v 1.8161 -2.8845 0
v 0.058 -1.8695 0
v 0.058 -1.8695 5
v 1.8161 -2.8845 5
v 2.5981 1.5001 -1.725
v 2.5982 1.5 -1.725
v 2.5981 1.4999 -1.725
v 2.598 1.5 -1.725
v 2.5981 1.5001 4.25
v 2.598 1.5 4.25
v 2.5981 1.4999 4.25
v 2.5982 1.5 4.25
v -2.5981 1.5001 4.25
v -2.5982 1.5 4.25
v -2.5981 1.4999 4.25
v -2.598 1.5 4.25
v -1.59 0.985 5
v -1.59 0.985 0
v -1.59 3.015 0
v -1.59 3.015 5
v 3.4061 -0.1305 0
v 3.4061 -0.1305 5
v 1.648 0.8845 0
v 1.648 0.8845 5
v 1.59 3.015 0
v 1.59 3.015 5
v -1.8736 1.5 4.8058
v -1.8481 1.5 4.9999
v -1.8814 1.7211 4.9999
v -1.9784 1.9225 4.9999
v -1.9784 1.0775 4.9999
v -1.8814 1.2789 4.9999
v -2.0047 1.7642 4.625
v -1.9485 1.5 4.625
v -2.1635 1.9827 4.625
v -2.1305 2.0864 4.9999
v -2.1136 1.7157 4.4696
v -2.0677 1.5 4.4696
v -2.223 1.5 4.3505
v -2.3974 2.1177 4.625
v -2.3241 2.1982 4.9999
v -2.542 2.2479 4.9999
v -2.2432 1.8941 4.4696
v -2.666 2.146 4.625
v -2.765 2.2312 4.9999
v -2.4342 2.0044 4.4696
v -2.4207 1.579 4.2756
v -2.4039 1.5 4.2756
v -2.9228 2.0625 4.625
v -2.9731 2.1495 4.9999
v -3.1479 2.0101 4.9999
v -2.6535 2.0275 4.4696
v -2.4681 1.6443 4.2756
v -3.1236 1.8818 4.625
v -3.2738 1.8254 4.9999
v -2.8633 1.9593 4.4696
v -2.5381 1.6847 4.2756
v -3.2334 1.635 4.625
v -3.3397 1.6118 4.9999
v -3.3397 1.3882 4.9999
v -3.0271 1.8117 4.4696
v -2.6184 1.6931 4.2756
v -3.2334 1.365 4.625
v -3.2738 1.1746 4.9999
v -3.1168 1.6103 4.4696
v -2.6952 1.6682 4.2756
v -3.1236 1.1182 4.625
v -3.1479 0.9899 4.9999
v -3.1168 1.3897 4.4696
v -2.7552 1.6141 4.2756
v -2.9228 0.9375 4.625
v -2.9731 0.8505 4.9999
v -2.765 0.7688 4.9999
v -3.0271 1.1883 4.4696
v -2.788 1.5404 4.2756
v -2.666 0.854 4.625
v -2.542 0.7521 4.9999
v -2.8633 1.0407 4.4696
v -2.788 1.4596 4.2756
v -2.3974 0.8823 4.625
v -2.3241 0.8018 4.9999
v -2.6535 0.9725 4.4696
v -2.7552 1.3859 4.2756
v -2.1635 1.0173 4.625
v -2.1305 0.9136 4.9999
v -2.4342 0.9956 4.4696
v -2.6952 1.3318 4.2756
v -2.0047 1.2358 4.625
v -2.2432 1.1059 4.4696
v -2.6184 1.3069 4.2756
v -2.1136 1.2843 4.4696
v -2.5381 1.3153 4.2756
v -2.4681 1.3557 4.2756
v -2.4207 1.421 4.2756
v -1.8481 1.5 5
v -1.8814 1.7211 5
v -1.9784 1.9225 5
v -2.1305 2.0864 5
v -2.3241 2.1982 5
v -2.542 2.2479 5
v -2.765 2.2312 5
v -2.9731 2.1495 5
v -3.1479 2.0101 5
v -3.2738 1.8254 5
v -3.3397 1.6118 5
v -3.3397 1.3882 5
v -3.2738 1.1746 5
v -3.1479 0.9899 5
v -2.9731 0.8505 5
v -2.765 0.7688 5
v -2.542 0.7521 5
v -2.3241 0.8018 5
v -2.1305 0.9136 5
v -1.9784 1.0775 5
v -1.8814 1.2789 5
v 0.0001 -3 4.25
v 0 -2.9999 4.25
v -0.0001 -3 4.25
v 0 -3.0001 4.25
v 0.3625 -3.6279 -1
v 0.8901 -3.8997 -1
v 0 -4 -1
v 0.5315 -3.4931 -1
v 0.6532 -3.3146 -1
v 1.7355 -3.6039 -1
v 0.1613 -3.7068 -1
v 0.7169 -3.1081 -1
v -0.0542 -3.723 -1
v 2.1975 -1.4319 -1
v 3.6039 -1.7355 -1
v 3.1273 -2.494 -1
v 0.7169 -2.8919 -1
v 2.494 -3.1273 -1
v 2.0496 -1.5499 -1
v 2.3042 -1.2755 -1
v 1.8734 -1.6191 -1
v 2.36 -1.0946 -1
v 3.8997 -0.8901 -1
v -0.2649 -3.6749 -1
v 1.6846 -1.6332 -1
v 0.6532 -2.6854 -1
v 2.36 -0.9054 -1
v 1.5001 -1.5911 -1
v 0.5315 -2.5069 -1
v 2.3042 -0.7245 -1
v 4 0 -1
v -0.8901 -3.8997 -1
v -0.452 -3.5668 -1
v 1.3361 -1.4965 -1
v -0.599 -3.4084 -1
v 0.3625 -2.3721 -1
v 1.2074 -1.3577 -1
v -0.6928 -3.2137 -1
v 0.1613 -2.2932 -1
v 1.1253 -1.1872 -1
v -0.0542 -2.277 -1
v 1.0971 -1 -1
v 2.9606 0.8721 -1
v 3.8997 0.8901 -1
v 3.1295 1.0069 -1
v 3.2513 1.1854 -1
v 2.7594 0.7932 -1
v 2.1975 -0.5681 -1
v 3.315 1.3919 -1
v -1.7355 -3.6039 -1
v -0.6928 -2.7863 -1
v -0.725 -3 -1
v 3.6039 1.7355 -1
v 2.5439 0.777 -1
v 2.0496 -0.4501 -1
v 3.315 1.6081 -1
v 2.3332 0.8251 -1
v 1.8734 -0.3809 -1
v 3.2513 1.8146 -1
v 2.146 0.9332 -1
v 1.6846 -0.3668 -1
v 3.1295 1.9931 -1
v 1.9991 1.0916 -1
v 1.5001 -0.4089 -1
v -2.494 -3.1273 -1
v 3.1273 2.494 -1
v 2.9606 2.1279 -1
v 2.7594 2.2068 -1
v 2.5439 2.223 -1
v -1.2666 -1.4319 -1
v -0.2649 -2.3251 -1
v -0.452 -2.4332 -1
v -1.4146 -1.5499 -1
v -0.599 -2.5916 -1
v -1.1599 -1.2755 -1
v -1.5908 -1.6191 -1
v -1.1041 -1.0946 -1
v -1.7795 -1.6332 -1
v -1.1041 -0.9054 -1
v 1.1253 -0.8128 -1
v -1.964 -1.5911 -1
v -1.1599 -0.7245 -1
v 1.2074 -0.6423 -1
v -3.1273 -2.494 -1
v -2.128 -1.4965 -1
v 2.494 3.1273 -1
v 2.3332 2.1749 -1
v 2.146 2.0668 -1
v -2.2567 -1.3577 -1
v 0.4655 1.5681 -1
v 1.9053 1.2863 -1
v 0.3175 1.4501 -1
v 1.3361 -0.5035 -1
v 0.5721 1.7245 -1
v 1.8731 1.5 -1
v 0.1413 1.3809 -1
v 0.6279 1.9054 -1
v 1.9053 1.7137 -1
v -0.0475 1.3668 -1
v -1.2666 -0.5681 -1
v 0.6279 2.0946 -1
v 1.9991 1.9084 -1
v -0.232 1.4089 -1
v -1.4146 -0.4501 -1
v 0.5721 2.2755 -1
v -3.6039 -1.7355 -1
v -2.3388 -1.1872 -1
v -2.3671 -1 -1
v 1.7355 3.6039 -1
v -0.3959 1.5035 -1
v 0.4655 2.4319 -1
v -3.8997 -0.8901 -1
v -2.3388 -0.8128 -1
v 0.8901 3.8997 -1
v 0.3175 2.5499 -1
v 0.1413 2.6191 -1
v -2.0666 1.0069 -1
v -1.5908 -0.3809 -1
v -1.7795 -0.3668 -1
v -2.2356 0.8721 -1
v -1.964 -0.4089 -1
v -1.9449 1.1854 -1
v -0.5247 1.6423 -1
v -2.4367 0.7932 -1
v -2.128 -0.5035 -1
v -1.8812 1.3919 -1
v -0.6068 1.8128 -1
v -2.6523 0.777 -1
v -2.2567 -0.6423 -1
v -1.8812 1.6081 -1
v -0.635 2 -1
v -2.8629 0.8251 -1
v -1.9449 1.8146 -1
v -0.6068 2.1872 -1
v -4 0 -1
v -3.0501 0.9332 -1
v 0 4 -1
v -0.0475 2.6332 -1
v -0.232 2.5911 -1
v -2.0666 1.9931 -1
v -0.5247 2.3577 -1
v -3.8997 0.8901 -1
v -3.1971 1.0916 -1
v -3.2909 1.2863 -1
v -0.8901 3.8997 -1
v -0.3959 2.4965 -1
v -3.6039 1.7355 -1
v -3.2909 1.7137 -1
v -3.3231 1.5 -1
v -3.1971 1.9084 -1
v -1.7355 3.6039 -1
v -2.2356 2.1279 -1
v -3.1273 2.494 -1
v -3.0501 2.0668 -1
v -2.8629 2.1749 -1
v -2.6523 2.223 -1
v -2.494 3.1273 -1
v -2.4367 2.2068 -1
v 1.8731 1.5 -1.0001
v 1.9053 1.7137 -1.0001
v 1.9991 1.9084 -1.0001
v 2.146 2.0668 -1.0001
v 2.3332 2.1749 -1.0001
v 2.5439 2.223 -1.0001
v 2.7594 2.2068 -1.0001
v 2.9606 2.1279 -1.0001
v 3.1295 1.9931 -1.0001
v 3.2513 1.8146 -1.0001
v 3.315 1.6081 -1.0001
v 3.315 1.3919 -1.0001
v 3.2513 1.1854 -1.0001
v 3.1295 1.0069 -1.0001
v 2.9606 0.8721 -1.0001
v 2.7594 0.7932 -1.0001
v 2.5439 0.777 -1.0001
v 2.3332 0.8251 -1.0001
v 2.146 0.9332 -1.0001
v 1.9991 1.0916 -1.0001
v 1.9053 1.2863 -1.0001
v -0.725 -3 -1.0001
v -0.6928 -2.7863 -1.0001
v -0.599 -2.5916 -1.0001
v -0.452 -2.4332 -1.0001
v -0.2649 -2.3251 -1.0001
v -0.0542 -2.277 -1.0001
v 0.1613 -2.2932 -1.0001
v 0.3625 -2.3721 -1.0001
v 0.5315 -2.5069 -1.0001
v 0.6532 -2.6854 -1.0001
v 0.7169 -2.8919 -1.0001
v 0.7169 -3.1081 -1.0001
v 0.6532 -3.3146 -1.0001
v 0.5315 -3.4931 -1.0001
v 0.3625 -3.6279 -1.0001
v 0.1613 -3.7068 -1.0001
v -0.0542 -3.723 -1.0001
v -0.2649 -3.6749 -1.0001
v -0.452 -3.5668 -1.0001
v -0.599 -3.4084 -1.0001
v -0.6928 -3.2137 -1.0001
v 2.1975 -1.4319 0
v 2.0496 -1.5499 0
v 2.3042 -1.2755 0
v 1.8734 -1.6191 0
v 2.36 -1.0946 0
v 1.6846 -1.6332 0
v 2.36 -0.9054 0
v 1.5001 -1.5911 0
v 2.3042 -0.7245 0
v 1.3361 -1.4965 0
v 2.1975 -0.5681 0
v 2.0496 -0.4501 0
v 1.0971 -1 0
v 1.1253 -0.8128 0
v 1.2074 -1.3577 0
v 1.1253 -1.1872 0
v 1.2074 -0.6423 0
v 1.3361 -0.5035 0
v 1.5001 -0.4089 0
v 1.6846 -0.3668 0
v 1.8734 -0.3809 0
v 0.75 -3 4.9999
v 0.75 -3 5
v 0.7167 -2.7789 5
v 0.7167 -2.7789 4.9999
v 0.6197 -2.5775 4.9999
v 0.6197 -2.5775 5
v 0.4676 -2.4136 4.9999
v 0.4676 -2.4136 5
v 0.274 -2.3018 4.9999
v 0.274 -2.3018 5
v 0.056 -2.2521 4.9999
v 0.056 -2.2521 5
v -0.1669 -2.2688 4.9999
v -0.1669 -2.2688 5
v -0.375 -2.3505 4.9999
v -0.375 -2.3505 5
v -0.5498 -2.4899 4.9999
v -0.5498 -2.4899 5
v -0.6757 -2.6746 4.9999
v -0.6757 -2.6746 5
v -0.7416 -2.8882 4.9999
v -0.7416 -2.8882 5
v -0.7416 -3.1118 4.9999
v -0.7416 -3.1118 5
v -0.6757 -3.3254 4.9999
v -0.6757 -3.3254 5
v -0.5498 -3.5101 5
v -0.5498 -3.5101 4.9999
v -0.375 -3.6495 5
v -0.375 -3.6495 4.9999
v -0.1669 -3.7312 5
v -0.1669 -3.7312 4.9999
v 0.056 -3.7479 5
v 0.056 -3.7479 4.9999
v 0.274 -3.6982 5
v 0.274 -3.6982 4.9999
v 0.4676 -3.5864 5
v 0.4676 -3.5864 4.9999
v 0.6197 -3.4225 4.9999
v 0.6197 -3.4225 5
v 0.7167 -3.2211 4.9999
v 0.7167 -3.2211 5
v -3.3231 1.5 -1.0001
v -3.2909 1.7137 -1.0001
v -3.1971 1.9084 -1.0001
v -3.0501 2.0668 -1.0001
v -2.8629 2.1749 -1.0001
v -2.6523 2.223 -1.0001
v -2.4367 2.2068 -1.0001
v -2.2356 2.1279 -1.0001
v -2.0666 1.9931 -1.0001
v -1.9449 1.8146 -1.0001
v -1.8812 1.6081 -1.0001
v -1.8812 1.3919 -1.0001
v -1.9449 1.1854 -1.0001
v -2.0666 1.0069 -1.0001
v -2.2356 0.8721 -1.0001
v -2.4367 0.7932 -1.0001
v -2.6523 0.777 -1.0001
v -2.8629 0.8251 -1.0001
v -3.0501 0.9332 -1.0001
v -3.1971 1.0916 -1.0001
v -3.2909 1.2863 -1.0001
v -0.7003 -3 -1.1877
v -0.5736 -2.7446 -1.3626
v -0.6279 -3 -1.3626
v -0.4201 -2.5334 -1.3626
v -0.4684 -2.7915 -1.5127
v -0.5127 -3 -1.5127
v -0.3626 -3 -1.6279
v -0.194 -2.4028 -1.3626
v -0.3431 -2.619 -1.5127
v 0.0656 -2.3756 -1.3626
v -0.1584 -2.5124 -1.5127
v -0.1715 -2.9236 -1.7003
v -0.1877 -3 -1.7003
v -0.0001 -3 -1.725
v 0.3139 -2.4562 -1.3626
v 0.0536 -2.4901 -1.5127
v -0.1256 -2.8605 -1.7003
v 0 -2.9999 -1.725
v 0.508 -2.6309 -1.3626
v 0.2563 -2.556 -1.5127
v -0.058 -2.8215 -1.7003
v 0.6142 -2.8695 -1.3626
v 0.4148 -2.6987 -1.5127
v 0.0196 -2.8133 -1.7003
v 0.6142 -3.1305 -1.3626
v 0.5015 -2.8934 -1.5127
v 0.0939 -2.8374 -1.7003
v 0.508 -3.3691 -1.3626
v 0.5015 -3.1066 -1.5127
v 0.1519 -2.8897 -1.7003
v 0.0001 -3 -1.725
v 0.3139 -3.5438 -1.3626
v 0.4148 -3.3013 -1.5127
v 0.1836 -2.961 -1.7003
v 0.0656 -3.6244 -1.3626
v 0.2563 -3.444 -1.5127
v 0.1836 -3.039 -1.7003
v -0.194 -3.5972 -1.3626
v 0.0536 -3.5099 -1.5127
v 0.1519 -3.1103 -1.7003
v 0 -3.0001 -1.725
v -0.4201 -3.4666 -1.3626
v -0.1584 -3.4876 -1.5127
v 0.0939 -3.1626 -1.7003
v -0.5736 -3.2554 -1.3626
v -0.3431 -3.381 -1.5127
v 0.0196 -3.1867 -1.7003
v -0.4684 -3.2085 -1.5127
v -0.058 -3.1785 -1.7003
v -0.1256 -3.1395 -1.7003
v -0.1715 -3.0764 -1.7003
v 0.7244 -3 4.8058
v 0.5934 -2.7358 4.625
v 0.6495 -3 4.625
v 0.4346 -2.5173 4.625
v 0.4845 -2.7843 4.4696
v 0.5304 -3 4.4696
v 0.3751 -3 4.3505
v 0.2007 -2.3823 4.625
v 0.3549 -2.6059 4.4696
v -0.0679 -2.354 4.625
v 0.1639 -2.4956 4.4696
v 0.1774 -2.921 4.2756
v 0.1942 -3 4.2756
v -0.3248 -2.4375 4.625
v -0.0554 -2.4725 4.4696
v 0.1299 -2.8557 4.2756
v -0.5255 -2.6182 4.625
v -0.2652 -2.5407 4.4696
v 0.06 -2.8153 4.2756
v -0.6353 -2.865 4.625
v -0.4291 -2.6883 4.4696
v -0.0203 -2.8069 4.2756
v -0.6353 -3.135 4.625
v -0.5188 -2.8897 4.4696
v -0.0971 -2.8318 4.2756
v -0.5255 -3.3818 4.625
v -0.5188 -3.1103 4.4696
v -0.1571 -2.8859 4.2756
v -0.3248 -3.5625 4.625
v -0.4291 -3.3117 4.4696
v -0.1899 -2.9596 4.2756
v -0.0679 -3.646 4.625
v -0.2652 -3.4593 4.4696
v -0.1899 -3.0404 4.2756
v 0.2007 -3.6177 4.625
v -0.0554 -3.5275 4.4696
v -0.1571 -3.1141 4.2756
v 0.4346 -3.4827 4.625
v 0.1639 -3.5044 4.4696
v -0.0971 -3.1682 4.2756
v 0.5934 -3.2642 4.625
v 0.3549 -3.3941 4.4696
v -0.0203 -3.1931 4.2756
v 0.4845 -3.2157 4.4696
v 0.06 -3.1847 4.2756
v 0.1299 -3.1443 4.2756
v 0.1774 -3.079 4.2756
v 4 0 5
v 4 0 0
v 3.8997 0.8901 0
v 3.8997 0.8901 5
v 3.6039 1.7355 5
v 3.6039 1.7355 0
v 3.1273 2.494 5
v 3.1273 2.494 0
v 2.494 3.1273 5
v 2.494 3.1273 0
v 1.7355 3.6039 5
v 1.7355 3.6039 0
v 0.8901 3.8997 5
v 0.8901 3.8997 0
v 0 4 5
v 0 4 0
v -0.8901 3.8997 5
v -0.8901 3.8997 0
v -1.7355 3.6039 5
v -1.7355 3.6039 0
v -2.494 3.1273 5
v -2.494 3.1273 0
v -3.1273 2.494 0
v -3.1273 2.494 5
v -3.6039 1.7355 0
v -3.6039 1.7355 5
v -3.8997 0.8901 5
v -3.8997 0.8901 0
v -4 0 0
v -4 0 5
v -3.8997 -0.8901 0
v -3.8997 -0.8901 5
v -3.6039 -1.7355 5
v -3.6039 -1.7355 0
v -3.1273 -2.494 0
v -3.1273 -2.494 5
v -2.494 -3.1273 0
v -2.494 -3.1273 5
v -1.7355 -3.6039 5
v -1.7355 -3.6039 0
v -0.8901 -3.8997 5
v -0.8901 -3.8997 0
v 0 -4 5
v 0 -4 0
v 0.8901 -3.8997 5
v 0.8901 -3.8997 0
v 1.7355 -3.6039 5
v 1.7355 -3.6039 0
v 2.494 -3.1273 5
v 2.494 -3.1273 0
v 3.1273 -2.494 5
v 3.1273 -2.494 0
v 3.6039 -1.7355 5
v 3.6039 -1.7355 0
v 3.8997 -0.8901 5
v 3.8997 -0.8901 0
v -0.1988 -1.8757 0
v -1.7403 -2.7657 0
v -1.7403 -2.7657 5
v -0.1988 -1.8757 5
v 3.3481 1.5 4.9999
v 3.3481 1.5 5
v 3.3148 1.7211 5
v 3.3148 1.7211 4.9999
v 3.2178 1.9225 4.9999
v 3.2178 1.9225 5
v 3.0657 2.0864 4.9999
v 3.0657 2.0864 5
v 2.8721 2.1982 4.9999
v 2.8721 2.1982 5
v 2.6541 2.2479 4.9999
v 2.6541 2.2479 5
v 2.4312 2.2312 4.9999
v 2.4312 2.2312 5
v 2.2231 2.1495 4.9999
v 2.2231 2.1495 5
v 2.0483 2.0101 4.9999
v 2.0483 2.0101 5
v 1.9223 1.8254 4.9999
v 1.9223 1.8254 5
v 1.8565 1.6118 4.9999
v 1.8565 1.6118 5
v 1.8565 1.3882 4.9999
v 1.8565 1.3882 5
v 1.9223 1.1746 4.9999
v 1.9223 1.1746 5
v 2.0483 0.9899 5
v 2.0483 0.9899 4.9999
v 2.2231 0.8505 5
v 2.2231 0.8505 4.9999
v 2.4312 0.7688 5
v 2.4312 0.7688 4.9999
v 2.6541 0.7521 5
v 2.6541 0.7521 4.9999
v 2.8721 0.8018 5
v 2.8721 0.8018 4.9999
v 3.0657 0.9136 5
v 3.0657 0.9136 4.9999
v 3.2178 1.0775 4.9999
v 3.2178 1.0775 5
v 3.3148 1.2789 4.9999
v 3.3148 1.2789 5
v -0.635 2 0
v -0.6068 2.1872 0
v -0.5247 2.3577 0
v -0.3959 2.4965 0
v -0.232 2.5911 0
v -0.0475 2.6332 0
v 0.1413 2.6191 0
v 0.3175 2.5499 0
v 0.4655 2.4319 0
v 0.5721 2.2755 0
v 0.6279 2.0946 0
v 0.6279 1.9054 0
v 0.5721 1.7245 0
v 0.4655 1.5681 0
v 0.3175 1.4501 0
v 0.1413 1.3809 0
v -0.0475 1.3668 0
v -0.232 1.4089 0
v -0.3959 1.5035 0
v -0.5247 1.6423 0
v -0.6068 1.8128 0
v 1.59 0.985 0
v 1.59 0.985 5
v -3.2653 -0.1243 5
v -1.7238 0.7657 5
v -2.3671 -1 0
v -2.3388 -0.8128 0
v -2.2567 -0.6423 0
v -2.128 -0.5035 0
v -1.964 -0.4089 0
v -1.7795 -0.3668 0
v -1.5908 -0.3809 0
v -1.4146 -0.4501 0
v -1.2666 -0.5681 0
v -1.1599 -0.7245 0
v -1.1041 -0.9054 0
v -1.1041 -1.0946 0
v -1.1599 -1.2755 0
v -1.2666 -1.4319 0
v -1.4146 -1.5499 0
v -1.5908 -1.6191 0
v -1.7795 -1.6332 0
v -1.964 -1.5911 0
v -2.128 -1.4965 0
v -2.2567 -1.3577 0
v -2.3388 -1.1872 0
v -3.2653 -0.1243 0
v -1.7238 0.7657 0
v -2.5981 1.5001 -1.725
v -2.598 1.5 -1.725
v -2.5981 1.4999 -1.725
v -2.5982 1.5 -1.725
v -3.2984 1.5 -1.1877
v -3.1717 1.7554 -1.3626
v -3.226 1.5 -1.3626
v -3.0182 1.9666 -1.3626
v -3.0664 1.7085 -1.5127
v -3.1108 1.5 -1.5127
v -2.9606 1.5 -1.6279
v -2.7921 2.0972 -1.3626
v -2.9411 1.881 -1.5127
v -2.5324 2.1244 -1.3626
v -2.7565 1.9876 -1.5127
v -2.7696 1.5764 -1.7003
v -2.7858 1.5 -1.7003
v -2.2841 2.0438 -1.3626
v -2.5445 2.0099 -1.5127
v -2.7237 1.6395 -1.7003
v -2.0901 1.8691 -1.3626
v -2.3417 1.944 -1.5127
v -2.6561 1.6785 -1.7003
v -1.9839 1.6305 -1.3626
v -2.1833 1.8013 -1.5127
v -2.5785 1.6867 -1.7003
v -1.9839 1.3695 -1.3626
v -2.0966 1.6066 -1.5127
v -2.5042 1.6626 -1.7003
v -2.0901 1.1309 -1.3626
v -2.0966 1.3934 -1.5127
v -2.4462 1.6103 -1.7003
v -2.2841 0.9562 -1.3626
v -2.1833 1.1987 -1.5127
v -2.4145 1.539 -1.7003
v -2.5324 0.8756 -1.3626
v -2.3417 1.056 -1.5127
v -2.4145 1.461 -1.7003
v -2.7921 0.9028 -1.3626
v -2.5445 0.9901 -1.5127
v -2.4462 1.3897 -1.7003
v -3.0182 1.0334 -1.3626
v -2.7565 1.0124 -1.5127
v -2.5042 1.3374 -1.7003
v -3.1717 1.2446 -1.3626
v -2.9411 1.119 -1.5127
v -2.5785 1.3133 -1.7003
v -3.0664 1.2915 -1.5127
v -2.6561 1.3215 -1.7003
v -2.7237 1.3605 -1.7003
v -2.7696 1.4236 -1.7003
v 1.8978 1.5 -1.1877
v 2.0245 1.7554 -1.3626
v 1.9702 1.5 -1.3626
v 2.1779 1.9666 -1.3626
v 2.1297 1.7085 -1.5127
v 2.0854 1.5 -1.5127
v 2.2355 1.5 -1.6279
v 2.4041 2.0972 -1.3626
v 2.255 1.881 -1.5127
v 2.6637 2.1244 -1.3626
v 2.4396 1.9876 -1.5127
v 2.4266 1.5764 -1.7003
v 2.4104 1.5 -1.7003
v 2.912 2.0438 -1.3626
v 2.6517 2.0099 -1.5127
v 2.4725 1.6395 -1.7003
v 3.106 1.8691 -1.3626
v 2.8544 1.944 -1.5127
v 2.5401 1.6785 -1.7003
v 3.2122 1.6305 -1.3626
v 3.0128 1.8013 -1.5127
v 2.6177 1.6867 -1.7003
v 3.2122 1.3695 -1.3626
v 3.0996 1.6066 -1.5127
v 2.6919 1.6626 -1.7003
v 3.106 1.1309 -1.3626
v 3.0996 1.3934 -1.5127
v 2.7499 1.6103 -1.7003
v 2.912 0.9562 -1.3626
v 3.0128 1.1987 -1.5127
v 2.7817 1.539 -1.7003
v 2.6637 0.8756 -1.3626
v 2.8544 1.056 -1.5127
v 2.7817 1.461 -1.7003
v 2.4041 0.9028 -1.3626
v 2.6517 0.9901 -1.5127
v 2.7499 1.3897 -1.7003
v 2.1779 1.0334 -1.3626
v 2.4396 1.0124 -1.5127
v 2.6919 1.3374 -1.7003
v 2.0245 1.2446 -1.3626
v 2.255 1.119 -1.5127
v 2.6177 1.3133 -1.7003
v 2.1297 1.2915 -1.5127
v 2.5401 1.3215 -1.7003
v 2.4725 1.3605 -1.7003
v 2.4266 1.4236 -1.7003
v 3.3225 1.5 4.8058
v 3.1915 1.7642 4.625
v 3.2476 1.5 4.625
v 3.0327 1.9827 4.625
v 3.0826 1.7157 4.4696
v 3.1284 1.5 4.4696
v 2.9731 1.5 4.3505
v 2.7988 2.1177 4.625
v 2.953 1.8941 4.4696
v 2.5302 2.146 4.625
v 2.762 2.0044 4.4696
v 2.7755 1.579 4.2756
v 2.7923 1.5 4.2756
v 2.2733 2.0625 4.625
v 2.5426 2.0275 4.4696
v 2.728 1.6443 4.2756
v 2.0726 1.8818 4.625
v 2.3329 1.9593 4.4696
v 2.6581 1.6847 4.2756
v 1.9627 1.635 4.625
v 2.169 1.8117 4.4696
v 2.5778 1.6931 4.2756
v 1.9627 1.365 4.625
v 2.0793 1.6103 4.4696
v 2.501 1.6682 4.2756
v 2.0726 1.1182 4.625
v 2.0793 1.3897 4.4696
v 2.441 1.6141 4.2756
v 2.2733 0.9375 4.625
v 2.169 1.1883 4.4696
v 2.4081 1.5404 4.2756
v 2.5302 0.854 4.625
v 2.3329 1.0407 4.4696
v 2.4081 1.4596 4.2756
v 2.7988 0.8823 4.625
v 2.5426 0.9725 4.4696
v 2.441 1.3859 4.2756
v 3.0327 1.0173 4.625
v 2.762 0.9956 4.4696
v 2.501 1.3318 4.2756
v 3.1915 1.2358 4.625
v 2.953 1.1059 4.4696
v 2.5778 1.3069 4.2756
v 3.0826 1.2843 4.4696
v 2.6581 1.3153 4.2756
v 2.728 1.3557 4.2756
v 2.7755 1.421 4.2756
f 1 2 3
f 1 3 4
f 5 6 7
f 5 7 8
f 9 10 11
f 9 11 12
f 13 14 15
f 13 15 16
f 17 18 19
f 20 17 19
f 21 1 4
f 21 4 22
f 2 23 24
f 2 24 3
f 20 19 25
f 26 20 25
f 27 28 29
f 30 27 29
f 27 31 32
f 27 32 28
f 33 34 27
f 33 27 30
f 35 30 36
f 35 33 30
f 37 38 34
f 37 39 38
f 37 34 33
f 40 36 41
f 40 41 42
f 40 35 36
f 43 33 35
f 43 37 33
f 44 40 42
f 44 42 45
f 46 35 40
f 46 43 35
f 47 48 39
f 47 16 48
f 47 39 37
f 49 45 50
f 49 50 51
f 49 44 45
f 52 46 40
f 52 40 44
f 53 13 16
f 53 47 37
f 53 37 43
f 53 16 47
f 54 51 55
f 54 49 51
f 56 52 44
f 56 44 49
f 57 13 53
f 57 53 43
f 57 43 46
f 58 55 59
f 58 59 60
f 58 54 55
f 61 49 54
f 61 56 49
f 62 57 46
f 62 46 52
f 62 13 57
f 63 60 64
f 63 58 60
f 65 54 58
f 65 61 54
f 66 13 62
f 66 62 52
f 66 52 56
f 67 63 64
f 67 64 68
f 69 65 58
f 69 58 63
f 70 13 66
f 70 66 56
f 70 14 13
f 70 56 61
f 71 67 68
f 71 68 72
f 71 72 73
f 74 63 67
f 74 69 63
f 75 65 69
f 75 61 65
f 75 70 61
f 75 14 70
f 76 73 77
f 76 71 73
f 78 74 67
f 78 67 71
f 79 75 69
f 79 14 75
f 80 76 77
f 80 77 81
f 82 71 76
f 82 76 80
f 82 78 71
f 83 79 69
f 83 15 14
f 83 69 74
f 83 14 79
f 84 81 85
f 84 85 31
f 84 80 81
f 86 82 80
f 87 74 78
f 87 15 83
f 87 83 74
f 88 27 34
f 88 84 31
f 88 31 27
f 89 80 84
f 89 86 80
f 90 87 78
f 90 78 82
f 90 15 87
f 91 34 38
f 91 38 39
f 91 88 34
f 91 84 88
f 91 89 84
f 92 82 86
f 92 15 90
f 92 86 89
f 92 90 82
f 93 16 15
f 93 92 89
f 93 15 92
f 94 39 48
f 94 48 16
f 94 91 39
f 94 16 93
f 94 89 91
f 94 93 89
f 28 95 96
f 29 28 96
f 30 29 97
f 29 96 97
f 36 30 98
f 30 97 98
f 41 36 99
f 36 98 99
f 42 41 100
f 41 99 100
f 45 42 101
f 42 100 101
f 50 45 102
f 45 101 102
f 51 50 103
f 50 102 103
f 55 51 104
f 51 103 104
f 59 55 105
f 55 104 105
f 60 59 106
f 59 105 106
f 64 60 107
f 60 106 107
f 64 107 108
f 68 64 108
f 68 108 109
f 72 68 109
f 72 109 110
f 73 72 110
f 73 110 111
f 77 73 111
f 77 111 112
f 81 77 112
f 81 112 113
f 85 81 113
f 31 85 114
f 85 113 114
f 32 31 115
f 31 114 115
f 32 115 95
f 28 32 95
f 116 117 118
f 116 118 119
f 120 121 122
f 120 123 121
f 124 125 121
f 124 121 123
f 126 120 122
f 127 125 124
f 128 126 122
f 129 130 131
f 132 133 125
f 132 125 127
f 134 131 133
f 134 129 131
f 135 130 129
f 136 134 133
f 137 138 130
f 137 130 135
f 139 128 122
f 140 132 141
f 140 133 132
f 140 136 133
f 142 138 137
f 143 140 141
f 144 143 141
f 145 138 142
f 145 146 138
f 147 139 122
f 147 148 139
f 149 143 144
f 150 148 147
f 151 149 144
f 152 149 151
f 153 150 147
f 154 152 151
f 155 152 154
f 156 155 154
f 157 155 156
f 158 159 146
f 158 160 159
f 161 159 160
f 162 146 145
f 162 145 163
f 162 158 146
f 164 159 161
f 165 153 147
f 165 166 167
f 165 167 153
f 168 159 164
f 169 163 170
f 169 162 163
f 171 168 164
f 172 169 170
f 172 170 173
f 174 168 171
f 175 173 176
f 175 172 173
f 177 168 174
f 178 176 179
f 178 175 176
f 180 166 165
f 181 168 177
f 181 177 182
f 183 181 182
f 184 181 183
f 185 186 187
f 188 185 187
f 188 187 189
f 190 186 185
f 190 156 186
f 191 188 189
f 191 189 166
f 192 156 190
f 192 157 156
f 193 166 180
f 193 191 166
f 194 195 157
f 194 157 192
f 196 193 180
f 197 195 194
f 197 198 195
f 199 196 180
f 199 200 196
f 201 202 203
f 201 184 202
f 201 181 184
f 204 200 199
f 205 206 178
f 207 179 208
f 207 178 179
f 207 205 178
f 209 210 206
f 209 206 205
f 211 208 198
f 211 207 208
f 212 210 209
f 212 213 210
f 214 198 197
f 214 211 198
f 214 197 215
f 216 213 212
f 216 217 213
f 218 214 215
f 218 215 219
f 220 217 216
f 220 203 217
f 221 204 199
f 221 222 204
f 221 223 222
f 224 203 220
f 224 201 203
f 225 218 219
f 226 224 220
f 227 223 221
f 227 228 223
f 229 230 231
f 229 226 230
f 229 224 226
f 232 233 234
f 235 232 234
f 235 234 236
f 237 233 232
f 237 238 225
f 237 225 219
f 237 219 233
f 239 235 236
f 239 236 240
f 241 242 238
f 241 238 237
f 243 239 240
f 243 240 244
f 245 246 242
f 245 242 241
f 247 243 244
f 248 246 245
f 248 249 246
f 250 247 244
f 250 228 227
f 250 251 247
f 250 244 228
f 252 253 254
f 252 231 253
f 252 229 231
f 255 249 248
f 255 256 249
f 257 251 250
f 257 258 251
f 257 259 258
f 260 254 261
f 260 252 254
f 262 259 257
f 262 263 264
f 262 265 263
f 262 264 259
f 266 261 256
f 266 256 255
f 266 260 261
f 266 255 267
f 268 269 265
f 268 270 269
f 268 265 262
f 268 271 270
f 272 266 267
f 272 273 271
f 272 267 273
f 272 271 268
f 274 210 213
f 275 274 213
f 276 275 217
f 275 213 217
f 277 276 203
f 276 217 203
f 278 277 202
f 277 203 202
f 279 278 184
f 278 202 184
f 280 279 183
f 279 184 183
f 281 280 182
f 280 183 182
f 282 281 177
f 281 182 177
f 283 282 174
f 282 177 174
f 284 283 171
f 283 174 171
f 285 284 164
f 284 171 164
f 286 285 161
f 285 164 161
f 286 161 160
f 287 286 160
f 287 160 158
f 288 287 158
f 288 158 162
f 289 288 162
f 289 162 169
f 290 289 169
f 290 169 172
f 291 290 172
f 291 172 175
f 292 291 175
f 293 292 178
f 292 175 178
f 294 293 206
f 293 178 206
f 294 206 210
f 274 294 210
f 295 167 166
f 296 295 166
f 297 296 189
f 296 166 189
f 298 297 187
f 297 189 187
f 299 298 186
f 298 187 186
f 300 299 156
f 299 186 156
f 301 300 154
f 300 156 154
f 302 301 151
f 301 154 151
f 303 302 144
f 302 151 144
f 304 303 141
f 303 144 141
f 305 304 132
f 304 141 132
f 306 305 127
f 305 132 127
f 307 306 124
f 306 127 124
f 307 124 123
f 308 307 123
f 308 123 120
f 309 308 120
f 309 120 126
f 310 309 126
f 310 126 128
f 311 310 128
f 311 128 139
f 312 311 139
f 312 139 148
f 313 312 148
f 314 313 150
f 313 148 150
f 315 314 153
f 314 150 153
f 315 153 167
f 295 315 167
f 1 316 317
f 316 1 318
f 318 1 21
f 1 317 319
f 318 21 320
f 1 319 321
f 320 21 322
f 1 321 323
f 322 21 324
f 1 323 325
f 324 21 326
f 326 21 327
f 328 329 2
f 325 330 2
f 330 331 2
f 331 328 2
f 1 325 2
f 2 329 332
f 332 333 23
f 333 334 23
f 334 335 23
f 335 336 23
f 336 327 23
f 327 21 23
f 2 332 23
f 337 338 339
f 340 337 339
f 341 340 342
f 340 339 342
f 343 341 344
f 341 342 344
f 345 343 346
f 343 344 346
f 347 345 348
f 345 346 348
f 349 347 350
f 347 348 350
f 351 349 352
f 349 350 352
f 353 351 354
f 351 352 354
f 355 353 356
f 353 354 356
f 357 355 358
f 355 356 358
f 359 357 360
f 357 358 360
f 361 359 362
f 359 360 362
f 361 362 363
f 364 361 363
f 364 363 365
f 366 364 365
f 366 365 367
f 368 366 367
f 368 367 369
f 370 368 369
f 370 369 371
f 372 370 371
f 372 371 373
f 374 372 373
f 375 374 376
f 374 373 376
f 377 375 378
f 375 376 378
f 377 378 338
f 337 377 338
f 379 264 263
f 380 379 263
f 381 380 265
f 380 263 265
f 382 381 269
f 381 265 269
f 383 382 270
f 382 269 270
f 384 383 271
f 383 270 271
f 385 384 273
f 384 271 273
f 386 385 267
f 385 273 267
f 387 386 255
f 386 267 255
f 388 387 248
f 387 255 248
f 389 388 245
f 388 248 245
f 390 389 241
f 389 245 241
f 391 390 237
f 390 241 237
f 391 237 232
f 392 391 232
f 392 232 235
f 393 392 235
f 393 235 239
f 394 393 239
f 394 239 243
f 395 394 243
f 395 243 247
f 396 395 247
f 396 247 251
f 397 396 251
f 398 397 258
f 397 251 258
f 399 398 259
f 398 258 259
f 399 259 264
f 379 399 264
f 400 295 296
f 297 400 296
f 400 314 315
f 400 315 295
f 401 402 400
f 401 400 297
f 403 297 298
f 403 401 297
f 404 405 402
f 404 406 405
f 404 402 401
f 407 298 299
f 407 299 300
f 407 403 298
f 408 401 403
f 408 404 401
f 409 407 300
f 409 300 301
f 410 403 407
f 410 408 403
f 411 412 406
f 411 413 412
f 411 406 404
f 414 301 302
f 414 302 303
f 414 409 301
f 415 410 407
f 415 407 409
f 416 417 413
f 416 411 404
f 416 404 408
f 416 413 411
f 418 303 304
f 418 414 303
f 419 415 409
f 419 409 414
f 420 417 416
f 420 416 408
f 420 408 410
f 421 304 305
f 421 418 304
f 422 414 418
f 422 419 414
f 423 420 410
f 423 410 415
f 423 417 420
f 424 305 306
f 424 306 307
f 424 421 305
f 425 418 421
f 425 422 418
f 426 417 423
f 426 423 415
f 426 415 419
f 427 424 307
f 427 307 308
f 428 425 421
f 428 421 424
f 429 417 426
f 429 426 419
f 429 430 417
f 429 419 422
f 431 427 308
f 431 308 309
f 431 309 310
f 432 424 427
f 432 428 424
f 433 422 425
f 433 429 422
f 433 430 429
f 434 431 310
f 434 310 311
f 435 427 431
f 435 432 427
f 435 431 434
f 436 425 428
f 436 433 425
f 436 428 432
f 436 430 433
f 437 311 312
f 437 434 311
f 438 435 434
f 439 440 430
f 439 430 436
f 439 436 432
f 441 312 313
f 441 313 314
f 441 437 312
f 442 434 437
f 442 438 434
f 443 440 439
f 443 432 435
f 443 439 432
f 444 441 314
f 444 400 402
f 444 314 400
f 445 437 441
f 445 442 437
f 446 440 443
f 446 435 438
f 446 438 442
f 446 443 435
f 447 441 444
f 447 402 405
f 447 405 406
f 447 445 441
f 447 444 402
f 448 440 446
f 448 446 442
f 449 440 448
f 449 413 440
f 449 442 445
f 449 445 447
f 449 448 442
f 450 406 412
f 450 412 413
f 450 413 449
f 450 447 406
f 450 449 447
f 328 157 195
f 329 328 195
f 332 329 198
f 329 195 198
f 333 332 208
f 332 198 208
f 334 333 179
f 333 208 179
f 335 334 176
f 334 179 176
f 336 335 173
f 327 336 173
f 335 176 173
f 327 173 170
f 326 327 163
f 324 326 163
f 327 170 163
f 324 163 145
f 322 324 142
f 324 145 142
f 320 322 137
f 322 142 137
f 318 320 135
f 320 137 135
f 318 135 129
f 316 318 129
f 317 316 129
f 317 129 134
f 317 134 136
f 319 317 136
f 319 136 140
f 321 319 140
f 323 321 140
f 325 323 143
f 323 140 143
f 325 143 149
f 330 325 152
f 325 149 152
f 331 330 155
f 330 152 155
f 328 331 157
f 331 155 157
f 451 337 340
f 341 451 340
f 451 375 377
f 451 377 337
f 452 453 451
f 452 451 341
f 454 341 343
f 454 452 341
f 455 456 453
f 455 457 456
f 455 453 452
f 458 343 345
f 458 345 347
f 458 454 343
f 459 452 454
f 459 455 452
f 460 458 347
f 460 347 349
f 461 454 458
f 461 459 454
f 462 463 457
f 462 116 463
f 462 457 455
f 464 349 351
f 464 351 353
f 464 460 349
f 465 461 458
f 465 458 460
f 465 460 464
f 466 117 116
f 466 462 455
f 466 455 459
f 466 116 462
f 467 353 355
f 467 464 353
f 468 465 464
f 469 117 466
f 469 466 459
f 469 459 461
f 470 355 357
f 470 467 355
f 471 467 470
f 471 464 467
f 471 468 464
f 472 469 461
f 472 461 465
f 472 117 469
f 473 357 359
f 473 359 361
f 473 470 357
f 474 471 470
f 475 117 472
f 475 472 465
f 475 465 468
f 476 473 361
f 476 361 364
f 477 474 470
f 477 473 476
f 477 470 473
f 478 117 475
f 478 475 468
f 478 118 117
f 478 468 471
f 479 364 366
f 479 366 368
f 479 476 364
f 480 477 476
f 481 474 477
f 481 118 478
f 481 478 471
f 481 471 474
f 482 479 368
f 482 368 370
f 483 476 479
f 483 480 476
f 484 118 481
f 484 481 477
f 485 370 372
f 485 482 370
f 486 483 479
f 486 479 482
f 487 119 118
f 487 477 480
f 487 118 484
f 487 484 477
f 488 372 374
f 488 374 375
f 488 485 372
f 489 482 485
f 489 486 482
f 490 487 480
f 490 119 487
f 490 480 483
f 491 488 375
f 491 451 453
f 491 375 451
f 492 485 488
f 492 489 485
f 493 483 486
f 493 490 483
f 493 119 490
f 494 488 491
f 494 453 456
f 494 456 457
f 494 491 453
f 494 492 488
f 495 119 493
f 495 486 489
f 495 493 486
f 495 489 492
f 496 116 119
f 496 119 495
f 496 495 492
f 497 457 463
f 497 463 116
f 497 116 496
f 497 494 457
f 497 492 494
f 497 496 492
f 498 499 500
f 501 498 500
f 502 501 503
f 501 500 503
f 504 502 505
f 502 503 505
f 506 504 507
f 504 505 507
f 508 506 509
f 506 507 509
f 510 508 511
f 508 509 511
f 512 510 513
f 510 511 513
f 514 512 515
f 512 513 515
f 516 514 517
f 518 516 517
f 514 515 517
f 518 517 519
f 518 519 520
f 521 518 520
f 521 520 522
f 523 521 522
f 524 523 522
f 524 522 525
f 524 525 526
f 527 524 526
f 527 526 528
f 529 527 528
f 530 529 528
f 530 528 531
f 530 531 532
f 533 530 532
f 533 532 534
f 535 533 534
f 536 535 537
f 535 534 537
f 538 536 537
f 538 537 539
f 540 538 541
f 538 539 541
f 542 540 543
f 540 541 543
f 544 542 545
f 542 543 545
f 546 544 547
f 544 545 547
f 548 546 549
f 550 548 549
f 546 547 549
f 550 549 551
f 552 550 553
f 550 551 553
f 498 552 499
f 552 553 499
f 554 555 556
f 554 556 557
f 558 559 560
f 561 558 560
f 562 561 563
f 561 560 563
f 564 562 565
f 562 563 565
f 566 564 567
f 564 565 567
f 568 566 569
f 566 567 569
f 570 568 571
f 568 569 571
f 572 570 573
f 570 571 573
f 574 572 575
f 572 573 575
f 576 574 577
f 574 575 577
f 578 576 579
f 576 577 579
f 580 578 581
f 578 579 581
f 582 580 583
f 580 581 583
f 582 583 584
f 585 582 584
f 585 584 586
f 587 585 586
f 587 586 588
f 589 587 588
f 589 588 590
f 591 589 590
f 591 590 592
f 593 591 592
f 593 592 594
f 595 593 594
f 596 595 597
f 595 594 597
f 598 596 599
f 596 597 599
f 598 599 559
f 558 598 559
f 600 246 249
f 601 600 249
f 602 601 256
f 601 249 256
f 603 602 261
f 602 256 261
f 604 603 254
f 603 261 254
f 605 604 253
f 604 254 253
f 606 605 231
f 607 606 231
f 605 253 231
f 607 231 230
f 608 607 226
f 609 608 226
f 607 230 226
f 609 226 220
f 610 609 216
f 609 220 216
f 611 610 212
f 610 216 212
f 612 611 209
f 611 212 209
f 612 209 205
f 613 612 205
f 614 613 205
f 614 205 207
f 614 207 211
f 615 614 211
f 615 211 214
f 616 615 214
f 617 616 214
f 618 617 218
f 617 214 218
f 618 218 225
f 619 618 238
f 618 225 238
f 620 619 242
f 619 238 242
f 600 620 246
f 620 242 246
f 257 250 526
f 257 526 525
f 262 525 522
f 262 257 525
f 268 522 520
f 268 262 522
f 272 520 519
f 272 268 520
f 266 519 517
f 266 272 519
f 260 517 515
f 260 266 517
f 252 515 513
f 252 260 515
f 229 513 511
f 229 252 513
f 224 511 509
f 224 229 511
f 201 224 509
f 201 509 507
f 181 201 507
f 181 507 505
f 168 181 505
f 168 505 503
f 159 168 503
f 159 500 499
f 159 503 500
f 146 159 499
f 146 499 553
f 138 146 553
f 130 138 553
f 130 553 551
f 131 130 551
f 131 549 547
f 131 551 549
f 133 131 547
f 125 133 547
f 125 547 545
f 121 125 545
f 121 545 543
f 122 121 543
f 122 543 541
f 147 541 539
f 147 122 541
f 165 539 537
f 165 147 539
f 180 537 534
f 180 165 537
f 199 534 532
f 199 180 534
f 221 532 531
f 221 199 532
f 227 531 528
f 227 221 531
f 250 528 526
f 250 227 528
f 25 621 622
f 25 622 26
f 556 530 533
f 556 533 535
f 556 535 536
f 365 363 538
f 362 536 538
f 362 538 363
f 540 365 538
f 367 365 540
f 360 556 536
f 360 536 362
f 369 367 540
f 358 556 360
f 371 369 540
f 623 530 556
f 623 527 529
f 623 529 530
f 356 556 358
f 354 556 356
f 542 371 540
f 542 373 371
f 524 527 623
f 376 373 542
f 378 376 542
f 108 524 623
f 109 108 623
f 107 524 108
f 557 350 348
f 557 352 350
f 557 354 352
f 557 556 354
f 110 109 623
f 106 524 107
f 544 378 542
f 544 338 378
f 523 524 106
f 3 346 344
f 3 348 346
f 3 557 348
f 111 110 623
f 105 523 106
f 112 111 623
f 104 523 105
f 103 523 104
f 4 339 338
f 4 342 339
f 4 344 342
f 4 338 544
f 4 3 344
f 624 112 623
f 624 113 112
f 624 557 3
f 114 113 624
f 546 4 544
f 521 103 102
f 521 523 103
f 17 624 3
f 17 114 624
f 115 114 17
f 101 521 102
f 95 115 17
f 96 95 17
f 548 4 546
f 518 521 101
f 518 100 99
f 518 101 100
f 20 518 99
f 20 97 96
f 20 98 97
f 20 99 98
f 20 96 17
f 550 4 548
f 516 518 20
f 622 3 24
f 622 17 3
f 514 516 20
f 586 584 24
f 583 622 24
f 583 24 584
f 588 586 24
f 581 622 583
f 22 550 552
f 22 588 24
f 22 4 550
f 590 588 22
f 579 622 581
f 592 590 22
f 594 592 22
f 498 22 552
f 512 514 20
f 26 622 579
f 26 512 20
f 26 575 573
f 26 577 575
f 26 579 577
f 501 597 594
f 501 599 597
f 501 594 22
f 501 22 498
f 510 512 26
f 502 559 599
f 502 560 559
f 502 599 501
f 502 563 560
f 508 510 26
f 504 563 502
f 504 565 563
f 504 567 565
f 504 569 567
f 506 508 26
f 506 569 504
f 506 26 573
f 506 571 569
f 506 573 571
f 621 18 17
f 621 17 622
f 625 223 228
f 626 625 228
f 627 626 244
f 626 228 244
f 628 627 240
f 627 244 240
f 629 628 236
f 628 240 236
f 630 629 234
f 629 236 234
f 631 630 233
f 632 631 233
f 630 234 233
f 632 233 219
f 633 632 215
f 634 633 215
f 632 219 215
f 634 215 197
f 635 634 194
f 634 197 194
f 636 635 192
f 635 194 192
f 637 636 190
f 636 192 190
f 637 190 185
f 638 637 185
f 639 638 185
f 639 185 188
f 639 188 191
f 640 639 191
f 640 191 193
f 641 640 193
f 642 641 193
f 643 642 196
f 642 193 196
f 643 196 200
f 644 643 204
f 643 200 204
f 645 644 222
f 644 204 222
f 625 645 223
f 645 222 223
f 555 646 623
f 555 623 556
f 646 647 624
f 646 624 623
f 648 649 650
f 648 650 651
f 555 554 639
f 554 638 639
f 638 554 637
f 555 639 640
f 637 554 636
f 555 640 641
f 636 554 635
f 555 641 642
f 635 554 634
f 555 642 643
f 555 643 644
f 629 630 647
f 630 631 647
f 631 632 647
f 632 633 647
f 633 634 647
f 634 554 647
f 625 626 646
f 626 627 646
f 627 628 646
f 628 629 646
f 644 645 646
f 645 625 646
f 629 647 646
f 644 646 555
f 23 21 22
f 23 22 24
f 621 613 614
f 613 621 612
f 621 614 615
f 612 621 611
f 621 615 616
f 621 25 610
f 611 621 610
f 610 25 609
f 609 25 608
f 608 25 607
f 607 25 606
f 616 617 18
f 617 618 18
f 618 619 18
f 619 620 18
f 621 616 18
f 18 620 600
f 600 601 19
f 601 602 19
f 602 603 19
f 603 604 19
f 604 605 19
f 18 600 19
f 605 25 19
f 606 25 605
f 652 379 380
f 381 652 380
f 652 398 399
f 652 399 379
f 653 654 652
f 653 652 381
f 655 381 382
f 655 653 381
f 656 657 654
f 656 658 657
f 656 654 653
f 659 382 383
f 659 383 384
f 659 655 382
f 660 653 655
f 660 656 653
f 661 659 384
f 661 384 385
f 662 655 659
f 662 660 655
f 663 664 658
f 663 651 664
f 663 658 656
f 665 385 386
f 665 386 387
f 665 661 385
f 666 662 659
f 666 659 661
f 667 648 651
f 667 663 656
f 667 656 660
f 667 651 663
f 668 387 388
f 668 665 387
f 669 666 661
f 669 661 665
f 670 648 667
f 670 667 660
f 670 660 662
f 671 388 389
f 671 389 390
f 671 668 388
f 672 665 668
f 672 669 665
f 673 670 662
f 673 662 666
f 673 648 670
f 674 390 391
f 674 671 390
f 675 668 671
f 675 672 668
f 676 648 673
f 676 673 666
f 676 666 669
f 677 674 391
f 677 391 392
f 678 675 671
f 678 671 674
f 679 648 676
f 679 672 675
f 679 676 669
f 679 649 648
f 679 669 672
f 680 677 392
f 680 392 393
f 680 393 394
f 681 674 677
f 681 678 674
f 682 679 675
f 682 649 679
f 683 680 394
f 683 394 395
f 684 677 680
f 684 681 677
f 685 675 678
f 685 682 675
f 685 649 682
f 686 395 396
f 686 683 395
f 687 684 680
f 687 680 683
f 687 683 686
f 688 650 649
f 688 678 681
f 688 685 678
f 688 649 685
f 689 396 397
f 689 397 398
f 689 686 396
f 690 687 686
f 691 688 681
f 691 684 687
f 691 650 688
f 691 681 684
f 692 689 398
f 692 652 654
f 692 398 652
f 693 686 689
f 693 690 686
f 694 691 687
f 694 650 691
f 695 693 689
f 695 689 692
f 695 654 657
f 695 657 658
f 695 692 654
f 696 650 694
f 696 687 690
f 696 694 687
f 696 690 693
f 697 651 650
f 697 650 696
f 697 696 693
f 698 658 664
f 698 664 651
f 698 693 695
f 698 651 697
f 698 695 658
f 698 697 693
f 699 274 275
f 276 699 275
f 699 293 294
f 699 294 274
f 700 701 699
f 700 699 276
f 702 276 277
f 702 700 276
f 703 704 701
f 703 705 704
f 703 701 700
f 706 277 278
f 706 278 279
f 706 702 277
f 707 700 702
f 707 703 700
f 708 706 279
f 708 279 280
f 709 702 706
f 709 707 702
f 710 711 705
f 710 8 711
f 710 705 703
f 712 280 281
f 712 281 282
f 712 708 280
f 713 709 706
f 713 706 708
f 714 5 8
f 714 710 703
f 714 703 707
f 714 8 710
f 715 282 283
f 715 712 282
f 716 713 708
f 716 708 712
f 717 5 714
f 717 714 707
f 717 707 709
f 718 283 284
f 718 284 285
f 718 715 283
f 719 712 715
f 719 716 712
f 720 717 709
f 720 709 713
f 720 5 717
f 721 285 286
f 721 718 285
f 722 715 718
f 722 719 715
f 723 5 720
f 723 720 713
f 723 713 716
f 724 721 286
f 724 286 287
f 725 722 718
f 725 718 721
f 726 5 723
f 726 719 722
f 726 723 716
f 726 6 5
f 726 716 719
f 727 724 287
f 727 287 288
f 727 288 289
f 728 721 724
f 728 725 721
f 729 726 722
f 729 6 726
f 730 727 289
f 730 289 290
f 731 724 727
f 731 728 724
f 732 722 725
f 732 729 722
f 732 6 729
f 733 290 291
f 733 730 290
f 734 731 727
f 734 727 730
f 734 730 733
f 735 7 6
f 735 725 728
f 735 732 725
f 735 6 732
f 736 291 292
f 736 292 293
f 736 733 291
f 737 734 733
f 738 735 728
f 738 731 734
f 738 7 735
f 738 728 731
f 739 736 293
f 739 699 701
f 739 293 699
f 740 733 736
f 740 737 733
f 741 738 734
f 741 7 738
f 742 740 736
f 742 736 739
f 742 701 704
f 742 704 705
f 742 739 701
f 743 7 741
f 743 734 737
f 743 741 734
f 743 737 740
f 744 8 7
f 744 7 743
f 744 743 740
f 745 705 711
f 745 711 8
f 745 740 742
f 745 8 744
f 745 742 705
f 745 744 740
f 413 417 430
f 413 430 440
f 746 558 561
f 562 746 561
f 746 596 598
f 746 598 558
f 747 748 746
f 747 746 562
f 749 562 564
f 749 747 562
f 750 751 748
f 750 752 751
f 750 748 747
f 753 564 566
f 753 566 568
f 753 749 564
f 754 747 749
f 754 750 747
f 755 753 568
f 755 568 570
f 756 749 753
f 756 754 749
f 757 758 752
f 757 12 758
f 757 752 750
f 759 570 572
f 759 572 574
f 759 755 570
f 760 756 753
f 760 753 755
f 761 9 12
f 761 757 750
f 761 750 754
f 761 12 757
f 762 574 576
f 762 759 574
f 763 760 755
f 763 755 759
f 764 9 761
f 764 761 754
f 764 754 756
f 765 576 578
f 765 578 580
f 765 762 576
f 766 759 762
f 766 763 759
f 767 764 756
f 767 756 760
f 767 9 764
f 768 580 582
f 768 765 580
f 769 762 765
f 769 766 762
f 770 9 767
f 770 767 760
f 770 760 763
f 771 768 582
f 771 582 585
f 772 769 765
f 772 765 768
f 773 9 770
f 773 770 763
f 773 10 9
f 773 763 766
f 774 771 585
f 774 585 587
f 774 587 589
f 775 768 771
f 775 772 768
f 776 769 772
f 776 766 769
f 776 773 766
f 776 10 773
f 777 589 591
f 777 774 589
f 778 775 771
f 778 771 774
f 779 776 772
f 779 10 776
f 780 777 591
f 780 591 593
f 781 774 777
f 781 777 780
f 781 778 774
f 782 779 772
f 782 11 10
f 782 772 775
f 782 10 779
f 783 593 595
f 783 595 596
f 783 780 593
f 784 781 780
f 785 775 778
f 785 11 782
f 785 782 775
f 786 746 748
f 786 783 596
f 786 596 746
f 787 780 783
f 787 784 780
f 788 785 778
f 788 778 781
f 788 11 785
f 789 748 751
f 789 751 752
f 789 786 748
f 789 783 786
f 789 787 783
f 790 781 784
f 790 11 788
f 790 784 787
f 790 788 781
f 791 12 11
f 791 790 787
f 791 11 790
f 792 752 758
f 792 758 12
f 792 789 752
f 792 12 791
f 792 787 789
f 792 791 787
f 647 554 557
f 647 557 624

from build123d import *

# Parameters (mm, degrees)
SKETCH1_R           = 4
SKETCH1_W           = 3.18
SKETCH1_H           = 2.03
BOSS_EXTRUDE1_DEPTH = 5
BOSS_EXTRUDE3_START = 1
SKETCH4_R           = 4
SKETCH4_R_2         = 0.635
BOSS_EXTRUDE3_DEPTH = 1
SKETCH2_R           = 0.725
BOSS_EXTRUDE2_DEPTH = 0.725
FILLET2_R           = 0.725
SKETCH3_R           = 0.75
CUT_EXTRUDE2_DEPTH  = 0.75
FILLET3_R           = 0.75


with BuildPart() as part:
    # Sketch1 → Boss-Extrude1 (new body)
    with BuildSketch(Plane.XY):
        Circle(SKETCH1_R)
        Polygon((3.406066592, -0.130519608), (1.648035023, 0.884480392), (0.058035023, -1.869480392), (1.816066592, -2.884480392), align=None, mode=Mode.SUBTRACT)
        with Locations((0, 2)):
            Rectangle(SKETCH1_W, SKETCH1_H, mode=Mode.SUBTRACT)
        Polygon((-1.740313417, -2.765688741), (-0.198788198, -1.875688741), (-1.723788198, 0.765688741), (-3.265313417, -0.124311259), align=None, mode=Mode.SUBTRACT)
    extrude(amount=BOSS_EXTRUDE1_DEPTH)

    # Sketch4 → Boss-Extrude3 (add)
    with BuildSketch(Plane(origin=(0, 0, 0), x_dir=(-1, 0, 0), z_dir=(0, 0, -1)).offset(BOSS_EXTRUDE3_START)):
        Circle(SKETCH4_R)
        with Locations((0, 2)):
            Circle(SKETCH4_R_2, mode=Mode.SUBTRACT)
        with Locations((1.732050808, -1)):
            Circle(SKETCH4_R_2, mode=Mode.SUBTRACT)
        with Locations((-1.732050808, -1)):
            Circle(SKETCH4_R_2, mode=Mode.SUBTRACT)
    extrude(amount=-BOSS_EXTRUDE3_DEPTH)

    # Sketch2 → Boss-Extrude2 (add)
    with BuildSketch(Plane(origin=(0, 0, -1), x_dir=(-1, 0, 0), z_dir=(0, 0, -1))):
        with Locations((0, -3)):
            Circle(SKETCH2_R)
        with Locations((-2.598076211, 1.5)):
            Circle(SKETCH2_R)
        with Locations((2.598076211, 1.5)):
            Circle(SKETCH2_R)
    extrude(amount=BOSS_EXTRUDE2_DEPTH)

    # Fillet2
    fillet2_edges = [part.edges().sort_by_distance(p)[0] for p in [
        (0.725, -3, -1.725),
        (3.323076211, 1.5, -1.725),
        (-1.873076211, 1.5, -1.725),
    ]]
    fillet(fillet2_edges, radius=FILLET2_R - 0.0001)  # a hair under: the kernel refuses the full size

    # Sketch3 → Cut-Extrude2 (cut)
    with BuildSketch(Plane.XY.offset(5)):
        with Locations((0, -3)):
            Circle(SKETCH3_R)
        with Locations((-2.598076211, 1.5)):
            Circle(SKETCH3_R)
        with Locations((2.598076211, 1.5)):
            Circle(SKETCH3_R)
    extrude(amount=-CUT_EXTRUDE2_DEPTH, mode=Mode.SUBTRACT)

    # Fillet3
    fillet3_edges = [part.edges().sort_by_distance(p)[0] for p in [
        (-0.75, -3, 4.25),
        (-3.348076211, 1.5, 4.25),
        (1.848076211, 1.5, 4.25),
    ]]
    fillet(fillet3_edges, radius=FILLET3_R - 0.0001)  # a hair under: the kernel refuses the full size


solid = part.part
